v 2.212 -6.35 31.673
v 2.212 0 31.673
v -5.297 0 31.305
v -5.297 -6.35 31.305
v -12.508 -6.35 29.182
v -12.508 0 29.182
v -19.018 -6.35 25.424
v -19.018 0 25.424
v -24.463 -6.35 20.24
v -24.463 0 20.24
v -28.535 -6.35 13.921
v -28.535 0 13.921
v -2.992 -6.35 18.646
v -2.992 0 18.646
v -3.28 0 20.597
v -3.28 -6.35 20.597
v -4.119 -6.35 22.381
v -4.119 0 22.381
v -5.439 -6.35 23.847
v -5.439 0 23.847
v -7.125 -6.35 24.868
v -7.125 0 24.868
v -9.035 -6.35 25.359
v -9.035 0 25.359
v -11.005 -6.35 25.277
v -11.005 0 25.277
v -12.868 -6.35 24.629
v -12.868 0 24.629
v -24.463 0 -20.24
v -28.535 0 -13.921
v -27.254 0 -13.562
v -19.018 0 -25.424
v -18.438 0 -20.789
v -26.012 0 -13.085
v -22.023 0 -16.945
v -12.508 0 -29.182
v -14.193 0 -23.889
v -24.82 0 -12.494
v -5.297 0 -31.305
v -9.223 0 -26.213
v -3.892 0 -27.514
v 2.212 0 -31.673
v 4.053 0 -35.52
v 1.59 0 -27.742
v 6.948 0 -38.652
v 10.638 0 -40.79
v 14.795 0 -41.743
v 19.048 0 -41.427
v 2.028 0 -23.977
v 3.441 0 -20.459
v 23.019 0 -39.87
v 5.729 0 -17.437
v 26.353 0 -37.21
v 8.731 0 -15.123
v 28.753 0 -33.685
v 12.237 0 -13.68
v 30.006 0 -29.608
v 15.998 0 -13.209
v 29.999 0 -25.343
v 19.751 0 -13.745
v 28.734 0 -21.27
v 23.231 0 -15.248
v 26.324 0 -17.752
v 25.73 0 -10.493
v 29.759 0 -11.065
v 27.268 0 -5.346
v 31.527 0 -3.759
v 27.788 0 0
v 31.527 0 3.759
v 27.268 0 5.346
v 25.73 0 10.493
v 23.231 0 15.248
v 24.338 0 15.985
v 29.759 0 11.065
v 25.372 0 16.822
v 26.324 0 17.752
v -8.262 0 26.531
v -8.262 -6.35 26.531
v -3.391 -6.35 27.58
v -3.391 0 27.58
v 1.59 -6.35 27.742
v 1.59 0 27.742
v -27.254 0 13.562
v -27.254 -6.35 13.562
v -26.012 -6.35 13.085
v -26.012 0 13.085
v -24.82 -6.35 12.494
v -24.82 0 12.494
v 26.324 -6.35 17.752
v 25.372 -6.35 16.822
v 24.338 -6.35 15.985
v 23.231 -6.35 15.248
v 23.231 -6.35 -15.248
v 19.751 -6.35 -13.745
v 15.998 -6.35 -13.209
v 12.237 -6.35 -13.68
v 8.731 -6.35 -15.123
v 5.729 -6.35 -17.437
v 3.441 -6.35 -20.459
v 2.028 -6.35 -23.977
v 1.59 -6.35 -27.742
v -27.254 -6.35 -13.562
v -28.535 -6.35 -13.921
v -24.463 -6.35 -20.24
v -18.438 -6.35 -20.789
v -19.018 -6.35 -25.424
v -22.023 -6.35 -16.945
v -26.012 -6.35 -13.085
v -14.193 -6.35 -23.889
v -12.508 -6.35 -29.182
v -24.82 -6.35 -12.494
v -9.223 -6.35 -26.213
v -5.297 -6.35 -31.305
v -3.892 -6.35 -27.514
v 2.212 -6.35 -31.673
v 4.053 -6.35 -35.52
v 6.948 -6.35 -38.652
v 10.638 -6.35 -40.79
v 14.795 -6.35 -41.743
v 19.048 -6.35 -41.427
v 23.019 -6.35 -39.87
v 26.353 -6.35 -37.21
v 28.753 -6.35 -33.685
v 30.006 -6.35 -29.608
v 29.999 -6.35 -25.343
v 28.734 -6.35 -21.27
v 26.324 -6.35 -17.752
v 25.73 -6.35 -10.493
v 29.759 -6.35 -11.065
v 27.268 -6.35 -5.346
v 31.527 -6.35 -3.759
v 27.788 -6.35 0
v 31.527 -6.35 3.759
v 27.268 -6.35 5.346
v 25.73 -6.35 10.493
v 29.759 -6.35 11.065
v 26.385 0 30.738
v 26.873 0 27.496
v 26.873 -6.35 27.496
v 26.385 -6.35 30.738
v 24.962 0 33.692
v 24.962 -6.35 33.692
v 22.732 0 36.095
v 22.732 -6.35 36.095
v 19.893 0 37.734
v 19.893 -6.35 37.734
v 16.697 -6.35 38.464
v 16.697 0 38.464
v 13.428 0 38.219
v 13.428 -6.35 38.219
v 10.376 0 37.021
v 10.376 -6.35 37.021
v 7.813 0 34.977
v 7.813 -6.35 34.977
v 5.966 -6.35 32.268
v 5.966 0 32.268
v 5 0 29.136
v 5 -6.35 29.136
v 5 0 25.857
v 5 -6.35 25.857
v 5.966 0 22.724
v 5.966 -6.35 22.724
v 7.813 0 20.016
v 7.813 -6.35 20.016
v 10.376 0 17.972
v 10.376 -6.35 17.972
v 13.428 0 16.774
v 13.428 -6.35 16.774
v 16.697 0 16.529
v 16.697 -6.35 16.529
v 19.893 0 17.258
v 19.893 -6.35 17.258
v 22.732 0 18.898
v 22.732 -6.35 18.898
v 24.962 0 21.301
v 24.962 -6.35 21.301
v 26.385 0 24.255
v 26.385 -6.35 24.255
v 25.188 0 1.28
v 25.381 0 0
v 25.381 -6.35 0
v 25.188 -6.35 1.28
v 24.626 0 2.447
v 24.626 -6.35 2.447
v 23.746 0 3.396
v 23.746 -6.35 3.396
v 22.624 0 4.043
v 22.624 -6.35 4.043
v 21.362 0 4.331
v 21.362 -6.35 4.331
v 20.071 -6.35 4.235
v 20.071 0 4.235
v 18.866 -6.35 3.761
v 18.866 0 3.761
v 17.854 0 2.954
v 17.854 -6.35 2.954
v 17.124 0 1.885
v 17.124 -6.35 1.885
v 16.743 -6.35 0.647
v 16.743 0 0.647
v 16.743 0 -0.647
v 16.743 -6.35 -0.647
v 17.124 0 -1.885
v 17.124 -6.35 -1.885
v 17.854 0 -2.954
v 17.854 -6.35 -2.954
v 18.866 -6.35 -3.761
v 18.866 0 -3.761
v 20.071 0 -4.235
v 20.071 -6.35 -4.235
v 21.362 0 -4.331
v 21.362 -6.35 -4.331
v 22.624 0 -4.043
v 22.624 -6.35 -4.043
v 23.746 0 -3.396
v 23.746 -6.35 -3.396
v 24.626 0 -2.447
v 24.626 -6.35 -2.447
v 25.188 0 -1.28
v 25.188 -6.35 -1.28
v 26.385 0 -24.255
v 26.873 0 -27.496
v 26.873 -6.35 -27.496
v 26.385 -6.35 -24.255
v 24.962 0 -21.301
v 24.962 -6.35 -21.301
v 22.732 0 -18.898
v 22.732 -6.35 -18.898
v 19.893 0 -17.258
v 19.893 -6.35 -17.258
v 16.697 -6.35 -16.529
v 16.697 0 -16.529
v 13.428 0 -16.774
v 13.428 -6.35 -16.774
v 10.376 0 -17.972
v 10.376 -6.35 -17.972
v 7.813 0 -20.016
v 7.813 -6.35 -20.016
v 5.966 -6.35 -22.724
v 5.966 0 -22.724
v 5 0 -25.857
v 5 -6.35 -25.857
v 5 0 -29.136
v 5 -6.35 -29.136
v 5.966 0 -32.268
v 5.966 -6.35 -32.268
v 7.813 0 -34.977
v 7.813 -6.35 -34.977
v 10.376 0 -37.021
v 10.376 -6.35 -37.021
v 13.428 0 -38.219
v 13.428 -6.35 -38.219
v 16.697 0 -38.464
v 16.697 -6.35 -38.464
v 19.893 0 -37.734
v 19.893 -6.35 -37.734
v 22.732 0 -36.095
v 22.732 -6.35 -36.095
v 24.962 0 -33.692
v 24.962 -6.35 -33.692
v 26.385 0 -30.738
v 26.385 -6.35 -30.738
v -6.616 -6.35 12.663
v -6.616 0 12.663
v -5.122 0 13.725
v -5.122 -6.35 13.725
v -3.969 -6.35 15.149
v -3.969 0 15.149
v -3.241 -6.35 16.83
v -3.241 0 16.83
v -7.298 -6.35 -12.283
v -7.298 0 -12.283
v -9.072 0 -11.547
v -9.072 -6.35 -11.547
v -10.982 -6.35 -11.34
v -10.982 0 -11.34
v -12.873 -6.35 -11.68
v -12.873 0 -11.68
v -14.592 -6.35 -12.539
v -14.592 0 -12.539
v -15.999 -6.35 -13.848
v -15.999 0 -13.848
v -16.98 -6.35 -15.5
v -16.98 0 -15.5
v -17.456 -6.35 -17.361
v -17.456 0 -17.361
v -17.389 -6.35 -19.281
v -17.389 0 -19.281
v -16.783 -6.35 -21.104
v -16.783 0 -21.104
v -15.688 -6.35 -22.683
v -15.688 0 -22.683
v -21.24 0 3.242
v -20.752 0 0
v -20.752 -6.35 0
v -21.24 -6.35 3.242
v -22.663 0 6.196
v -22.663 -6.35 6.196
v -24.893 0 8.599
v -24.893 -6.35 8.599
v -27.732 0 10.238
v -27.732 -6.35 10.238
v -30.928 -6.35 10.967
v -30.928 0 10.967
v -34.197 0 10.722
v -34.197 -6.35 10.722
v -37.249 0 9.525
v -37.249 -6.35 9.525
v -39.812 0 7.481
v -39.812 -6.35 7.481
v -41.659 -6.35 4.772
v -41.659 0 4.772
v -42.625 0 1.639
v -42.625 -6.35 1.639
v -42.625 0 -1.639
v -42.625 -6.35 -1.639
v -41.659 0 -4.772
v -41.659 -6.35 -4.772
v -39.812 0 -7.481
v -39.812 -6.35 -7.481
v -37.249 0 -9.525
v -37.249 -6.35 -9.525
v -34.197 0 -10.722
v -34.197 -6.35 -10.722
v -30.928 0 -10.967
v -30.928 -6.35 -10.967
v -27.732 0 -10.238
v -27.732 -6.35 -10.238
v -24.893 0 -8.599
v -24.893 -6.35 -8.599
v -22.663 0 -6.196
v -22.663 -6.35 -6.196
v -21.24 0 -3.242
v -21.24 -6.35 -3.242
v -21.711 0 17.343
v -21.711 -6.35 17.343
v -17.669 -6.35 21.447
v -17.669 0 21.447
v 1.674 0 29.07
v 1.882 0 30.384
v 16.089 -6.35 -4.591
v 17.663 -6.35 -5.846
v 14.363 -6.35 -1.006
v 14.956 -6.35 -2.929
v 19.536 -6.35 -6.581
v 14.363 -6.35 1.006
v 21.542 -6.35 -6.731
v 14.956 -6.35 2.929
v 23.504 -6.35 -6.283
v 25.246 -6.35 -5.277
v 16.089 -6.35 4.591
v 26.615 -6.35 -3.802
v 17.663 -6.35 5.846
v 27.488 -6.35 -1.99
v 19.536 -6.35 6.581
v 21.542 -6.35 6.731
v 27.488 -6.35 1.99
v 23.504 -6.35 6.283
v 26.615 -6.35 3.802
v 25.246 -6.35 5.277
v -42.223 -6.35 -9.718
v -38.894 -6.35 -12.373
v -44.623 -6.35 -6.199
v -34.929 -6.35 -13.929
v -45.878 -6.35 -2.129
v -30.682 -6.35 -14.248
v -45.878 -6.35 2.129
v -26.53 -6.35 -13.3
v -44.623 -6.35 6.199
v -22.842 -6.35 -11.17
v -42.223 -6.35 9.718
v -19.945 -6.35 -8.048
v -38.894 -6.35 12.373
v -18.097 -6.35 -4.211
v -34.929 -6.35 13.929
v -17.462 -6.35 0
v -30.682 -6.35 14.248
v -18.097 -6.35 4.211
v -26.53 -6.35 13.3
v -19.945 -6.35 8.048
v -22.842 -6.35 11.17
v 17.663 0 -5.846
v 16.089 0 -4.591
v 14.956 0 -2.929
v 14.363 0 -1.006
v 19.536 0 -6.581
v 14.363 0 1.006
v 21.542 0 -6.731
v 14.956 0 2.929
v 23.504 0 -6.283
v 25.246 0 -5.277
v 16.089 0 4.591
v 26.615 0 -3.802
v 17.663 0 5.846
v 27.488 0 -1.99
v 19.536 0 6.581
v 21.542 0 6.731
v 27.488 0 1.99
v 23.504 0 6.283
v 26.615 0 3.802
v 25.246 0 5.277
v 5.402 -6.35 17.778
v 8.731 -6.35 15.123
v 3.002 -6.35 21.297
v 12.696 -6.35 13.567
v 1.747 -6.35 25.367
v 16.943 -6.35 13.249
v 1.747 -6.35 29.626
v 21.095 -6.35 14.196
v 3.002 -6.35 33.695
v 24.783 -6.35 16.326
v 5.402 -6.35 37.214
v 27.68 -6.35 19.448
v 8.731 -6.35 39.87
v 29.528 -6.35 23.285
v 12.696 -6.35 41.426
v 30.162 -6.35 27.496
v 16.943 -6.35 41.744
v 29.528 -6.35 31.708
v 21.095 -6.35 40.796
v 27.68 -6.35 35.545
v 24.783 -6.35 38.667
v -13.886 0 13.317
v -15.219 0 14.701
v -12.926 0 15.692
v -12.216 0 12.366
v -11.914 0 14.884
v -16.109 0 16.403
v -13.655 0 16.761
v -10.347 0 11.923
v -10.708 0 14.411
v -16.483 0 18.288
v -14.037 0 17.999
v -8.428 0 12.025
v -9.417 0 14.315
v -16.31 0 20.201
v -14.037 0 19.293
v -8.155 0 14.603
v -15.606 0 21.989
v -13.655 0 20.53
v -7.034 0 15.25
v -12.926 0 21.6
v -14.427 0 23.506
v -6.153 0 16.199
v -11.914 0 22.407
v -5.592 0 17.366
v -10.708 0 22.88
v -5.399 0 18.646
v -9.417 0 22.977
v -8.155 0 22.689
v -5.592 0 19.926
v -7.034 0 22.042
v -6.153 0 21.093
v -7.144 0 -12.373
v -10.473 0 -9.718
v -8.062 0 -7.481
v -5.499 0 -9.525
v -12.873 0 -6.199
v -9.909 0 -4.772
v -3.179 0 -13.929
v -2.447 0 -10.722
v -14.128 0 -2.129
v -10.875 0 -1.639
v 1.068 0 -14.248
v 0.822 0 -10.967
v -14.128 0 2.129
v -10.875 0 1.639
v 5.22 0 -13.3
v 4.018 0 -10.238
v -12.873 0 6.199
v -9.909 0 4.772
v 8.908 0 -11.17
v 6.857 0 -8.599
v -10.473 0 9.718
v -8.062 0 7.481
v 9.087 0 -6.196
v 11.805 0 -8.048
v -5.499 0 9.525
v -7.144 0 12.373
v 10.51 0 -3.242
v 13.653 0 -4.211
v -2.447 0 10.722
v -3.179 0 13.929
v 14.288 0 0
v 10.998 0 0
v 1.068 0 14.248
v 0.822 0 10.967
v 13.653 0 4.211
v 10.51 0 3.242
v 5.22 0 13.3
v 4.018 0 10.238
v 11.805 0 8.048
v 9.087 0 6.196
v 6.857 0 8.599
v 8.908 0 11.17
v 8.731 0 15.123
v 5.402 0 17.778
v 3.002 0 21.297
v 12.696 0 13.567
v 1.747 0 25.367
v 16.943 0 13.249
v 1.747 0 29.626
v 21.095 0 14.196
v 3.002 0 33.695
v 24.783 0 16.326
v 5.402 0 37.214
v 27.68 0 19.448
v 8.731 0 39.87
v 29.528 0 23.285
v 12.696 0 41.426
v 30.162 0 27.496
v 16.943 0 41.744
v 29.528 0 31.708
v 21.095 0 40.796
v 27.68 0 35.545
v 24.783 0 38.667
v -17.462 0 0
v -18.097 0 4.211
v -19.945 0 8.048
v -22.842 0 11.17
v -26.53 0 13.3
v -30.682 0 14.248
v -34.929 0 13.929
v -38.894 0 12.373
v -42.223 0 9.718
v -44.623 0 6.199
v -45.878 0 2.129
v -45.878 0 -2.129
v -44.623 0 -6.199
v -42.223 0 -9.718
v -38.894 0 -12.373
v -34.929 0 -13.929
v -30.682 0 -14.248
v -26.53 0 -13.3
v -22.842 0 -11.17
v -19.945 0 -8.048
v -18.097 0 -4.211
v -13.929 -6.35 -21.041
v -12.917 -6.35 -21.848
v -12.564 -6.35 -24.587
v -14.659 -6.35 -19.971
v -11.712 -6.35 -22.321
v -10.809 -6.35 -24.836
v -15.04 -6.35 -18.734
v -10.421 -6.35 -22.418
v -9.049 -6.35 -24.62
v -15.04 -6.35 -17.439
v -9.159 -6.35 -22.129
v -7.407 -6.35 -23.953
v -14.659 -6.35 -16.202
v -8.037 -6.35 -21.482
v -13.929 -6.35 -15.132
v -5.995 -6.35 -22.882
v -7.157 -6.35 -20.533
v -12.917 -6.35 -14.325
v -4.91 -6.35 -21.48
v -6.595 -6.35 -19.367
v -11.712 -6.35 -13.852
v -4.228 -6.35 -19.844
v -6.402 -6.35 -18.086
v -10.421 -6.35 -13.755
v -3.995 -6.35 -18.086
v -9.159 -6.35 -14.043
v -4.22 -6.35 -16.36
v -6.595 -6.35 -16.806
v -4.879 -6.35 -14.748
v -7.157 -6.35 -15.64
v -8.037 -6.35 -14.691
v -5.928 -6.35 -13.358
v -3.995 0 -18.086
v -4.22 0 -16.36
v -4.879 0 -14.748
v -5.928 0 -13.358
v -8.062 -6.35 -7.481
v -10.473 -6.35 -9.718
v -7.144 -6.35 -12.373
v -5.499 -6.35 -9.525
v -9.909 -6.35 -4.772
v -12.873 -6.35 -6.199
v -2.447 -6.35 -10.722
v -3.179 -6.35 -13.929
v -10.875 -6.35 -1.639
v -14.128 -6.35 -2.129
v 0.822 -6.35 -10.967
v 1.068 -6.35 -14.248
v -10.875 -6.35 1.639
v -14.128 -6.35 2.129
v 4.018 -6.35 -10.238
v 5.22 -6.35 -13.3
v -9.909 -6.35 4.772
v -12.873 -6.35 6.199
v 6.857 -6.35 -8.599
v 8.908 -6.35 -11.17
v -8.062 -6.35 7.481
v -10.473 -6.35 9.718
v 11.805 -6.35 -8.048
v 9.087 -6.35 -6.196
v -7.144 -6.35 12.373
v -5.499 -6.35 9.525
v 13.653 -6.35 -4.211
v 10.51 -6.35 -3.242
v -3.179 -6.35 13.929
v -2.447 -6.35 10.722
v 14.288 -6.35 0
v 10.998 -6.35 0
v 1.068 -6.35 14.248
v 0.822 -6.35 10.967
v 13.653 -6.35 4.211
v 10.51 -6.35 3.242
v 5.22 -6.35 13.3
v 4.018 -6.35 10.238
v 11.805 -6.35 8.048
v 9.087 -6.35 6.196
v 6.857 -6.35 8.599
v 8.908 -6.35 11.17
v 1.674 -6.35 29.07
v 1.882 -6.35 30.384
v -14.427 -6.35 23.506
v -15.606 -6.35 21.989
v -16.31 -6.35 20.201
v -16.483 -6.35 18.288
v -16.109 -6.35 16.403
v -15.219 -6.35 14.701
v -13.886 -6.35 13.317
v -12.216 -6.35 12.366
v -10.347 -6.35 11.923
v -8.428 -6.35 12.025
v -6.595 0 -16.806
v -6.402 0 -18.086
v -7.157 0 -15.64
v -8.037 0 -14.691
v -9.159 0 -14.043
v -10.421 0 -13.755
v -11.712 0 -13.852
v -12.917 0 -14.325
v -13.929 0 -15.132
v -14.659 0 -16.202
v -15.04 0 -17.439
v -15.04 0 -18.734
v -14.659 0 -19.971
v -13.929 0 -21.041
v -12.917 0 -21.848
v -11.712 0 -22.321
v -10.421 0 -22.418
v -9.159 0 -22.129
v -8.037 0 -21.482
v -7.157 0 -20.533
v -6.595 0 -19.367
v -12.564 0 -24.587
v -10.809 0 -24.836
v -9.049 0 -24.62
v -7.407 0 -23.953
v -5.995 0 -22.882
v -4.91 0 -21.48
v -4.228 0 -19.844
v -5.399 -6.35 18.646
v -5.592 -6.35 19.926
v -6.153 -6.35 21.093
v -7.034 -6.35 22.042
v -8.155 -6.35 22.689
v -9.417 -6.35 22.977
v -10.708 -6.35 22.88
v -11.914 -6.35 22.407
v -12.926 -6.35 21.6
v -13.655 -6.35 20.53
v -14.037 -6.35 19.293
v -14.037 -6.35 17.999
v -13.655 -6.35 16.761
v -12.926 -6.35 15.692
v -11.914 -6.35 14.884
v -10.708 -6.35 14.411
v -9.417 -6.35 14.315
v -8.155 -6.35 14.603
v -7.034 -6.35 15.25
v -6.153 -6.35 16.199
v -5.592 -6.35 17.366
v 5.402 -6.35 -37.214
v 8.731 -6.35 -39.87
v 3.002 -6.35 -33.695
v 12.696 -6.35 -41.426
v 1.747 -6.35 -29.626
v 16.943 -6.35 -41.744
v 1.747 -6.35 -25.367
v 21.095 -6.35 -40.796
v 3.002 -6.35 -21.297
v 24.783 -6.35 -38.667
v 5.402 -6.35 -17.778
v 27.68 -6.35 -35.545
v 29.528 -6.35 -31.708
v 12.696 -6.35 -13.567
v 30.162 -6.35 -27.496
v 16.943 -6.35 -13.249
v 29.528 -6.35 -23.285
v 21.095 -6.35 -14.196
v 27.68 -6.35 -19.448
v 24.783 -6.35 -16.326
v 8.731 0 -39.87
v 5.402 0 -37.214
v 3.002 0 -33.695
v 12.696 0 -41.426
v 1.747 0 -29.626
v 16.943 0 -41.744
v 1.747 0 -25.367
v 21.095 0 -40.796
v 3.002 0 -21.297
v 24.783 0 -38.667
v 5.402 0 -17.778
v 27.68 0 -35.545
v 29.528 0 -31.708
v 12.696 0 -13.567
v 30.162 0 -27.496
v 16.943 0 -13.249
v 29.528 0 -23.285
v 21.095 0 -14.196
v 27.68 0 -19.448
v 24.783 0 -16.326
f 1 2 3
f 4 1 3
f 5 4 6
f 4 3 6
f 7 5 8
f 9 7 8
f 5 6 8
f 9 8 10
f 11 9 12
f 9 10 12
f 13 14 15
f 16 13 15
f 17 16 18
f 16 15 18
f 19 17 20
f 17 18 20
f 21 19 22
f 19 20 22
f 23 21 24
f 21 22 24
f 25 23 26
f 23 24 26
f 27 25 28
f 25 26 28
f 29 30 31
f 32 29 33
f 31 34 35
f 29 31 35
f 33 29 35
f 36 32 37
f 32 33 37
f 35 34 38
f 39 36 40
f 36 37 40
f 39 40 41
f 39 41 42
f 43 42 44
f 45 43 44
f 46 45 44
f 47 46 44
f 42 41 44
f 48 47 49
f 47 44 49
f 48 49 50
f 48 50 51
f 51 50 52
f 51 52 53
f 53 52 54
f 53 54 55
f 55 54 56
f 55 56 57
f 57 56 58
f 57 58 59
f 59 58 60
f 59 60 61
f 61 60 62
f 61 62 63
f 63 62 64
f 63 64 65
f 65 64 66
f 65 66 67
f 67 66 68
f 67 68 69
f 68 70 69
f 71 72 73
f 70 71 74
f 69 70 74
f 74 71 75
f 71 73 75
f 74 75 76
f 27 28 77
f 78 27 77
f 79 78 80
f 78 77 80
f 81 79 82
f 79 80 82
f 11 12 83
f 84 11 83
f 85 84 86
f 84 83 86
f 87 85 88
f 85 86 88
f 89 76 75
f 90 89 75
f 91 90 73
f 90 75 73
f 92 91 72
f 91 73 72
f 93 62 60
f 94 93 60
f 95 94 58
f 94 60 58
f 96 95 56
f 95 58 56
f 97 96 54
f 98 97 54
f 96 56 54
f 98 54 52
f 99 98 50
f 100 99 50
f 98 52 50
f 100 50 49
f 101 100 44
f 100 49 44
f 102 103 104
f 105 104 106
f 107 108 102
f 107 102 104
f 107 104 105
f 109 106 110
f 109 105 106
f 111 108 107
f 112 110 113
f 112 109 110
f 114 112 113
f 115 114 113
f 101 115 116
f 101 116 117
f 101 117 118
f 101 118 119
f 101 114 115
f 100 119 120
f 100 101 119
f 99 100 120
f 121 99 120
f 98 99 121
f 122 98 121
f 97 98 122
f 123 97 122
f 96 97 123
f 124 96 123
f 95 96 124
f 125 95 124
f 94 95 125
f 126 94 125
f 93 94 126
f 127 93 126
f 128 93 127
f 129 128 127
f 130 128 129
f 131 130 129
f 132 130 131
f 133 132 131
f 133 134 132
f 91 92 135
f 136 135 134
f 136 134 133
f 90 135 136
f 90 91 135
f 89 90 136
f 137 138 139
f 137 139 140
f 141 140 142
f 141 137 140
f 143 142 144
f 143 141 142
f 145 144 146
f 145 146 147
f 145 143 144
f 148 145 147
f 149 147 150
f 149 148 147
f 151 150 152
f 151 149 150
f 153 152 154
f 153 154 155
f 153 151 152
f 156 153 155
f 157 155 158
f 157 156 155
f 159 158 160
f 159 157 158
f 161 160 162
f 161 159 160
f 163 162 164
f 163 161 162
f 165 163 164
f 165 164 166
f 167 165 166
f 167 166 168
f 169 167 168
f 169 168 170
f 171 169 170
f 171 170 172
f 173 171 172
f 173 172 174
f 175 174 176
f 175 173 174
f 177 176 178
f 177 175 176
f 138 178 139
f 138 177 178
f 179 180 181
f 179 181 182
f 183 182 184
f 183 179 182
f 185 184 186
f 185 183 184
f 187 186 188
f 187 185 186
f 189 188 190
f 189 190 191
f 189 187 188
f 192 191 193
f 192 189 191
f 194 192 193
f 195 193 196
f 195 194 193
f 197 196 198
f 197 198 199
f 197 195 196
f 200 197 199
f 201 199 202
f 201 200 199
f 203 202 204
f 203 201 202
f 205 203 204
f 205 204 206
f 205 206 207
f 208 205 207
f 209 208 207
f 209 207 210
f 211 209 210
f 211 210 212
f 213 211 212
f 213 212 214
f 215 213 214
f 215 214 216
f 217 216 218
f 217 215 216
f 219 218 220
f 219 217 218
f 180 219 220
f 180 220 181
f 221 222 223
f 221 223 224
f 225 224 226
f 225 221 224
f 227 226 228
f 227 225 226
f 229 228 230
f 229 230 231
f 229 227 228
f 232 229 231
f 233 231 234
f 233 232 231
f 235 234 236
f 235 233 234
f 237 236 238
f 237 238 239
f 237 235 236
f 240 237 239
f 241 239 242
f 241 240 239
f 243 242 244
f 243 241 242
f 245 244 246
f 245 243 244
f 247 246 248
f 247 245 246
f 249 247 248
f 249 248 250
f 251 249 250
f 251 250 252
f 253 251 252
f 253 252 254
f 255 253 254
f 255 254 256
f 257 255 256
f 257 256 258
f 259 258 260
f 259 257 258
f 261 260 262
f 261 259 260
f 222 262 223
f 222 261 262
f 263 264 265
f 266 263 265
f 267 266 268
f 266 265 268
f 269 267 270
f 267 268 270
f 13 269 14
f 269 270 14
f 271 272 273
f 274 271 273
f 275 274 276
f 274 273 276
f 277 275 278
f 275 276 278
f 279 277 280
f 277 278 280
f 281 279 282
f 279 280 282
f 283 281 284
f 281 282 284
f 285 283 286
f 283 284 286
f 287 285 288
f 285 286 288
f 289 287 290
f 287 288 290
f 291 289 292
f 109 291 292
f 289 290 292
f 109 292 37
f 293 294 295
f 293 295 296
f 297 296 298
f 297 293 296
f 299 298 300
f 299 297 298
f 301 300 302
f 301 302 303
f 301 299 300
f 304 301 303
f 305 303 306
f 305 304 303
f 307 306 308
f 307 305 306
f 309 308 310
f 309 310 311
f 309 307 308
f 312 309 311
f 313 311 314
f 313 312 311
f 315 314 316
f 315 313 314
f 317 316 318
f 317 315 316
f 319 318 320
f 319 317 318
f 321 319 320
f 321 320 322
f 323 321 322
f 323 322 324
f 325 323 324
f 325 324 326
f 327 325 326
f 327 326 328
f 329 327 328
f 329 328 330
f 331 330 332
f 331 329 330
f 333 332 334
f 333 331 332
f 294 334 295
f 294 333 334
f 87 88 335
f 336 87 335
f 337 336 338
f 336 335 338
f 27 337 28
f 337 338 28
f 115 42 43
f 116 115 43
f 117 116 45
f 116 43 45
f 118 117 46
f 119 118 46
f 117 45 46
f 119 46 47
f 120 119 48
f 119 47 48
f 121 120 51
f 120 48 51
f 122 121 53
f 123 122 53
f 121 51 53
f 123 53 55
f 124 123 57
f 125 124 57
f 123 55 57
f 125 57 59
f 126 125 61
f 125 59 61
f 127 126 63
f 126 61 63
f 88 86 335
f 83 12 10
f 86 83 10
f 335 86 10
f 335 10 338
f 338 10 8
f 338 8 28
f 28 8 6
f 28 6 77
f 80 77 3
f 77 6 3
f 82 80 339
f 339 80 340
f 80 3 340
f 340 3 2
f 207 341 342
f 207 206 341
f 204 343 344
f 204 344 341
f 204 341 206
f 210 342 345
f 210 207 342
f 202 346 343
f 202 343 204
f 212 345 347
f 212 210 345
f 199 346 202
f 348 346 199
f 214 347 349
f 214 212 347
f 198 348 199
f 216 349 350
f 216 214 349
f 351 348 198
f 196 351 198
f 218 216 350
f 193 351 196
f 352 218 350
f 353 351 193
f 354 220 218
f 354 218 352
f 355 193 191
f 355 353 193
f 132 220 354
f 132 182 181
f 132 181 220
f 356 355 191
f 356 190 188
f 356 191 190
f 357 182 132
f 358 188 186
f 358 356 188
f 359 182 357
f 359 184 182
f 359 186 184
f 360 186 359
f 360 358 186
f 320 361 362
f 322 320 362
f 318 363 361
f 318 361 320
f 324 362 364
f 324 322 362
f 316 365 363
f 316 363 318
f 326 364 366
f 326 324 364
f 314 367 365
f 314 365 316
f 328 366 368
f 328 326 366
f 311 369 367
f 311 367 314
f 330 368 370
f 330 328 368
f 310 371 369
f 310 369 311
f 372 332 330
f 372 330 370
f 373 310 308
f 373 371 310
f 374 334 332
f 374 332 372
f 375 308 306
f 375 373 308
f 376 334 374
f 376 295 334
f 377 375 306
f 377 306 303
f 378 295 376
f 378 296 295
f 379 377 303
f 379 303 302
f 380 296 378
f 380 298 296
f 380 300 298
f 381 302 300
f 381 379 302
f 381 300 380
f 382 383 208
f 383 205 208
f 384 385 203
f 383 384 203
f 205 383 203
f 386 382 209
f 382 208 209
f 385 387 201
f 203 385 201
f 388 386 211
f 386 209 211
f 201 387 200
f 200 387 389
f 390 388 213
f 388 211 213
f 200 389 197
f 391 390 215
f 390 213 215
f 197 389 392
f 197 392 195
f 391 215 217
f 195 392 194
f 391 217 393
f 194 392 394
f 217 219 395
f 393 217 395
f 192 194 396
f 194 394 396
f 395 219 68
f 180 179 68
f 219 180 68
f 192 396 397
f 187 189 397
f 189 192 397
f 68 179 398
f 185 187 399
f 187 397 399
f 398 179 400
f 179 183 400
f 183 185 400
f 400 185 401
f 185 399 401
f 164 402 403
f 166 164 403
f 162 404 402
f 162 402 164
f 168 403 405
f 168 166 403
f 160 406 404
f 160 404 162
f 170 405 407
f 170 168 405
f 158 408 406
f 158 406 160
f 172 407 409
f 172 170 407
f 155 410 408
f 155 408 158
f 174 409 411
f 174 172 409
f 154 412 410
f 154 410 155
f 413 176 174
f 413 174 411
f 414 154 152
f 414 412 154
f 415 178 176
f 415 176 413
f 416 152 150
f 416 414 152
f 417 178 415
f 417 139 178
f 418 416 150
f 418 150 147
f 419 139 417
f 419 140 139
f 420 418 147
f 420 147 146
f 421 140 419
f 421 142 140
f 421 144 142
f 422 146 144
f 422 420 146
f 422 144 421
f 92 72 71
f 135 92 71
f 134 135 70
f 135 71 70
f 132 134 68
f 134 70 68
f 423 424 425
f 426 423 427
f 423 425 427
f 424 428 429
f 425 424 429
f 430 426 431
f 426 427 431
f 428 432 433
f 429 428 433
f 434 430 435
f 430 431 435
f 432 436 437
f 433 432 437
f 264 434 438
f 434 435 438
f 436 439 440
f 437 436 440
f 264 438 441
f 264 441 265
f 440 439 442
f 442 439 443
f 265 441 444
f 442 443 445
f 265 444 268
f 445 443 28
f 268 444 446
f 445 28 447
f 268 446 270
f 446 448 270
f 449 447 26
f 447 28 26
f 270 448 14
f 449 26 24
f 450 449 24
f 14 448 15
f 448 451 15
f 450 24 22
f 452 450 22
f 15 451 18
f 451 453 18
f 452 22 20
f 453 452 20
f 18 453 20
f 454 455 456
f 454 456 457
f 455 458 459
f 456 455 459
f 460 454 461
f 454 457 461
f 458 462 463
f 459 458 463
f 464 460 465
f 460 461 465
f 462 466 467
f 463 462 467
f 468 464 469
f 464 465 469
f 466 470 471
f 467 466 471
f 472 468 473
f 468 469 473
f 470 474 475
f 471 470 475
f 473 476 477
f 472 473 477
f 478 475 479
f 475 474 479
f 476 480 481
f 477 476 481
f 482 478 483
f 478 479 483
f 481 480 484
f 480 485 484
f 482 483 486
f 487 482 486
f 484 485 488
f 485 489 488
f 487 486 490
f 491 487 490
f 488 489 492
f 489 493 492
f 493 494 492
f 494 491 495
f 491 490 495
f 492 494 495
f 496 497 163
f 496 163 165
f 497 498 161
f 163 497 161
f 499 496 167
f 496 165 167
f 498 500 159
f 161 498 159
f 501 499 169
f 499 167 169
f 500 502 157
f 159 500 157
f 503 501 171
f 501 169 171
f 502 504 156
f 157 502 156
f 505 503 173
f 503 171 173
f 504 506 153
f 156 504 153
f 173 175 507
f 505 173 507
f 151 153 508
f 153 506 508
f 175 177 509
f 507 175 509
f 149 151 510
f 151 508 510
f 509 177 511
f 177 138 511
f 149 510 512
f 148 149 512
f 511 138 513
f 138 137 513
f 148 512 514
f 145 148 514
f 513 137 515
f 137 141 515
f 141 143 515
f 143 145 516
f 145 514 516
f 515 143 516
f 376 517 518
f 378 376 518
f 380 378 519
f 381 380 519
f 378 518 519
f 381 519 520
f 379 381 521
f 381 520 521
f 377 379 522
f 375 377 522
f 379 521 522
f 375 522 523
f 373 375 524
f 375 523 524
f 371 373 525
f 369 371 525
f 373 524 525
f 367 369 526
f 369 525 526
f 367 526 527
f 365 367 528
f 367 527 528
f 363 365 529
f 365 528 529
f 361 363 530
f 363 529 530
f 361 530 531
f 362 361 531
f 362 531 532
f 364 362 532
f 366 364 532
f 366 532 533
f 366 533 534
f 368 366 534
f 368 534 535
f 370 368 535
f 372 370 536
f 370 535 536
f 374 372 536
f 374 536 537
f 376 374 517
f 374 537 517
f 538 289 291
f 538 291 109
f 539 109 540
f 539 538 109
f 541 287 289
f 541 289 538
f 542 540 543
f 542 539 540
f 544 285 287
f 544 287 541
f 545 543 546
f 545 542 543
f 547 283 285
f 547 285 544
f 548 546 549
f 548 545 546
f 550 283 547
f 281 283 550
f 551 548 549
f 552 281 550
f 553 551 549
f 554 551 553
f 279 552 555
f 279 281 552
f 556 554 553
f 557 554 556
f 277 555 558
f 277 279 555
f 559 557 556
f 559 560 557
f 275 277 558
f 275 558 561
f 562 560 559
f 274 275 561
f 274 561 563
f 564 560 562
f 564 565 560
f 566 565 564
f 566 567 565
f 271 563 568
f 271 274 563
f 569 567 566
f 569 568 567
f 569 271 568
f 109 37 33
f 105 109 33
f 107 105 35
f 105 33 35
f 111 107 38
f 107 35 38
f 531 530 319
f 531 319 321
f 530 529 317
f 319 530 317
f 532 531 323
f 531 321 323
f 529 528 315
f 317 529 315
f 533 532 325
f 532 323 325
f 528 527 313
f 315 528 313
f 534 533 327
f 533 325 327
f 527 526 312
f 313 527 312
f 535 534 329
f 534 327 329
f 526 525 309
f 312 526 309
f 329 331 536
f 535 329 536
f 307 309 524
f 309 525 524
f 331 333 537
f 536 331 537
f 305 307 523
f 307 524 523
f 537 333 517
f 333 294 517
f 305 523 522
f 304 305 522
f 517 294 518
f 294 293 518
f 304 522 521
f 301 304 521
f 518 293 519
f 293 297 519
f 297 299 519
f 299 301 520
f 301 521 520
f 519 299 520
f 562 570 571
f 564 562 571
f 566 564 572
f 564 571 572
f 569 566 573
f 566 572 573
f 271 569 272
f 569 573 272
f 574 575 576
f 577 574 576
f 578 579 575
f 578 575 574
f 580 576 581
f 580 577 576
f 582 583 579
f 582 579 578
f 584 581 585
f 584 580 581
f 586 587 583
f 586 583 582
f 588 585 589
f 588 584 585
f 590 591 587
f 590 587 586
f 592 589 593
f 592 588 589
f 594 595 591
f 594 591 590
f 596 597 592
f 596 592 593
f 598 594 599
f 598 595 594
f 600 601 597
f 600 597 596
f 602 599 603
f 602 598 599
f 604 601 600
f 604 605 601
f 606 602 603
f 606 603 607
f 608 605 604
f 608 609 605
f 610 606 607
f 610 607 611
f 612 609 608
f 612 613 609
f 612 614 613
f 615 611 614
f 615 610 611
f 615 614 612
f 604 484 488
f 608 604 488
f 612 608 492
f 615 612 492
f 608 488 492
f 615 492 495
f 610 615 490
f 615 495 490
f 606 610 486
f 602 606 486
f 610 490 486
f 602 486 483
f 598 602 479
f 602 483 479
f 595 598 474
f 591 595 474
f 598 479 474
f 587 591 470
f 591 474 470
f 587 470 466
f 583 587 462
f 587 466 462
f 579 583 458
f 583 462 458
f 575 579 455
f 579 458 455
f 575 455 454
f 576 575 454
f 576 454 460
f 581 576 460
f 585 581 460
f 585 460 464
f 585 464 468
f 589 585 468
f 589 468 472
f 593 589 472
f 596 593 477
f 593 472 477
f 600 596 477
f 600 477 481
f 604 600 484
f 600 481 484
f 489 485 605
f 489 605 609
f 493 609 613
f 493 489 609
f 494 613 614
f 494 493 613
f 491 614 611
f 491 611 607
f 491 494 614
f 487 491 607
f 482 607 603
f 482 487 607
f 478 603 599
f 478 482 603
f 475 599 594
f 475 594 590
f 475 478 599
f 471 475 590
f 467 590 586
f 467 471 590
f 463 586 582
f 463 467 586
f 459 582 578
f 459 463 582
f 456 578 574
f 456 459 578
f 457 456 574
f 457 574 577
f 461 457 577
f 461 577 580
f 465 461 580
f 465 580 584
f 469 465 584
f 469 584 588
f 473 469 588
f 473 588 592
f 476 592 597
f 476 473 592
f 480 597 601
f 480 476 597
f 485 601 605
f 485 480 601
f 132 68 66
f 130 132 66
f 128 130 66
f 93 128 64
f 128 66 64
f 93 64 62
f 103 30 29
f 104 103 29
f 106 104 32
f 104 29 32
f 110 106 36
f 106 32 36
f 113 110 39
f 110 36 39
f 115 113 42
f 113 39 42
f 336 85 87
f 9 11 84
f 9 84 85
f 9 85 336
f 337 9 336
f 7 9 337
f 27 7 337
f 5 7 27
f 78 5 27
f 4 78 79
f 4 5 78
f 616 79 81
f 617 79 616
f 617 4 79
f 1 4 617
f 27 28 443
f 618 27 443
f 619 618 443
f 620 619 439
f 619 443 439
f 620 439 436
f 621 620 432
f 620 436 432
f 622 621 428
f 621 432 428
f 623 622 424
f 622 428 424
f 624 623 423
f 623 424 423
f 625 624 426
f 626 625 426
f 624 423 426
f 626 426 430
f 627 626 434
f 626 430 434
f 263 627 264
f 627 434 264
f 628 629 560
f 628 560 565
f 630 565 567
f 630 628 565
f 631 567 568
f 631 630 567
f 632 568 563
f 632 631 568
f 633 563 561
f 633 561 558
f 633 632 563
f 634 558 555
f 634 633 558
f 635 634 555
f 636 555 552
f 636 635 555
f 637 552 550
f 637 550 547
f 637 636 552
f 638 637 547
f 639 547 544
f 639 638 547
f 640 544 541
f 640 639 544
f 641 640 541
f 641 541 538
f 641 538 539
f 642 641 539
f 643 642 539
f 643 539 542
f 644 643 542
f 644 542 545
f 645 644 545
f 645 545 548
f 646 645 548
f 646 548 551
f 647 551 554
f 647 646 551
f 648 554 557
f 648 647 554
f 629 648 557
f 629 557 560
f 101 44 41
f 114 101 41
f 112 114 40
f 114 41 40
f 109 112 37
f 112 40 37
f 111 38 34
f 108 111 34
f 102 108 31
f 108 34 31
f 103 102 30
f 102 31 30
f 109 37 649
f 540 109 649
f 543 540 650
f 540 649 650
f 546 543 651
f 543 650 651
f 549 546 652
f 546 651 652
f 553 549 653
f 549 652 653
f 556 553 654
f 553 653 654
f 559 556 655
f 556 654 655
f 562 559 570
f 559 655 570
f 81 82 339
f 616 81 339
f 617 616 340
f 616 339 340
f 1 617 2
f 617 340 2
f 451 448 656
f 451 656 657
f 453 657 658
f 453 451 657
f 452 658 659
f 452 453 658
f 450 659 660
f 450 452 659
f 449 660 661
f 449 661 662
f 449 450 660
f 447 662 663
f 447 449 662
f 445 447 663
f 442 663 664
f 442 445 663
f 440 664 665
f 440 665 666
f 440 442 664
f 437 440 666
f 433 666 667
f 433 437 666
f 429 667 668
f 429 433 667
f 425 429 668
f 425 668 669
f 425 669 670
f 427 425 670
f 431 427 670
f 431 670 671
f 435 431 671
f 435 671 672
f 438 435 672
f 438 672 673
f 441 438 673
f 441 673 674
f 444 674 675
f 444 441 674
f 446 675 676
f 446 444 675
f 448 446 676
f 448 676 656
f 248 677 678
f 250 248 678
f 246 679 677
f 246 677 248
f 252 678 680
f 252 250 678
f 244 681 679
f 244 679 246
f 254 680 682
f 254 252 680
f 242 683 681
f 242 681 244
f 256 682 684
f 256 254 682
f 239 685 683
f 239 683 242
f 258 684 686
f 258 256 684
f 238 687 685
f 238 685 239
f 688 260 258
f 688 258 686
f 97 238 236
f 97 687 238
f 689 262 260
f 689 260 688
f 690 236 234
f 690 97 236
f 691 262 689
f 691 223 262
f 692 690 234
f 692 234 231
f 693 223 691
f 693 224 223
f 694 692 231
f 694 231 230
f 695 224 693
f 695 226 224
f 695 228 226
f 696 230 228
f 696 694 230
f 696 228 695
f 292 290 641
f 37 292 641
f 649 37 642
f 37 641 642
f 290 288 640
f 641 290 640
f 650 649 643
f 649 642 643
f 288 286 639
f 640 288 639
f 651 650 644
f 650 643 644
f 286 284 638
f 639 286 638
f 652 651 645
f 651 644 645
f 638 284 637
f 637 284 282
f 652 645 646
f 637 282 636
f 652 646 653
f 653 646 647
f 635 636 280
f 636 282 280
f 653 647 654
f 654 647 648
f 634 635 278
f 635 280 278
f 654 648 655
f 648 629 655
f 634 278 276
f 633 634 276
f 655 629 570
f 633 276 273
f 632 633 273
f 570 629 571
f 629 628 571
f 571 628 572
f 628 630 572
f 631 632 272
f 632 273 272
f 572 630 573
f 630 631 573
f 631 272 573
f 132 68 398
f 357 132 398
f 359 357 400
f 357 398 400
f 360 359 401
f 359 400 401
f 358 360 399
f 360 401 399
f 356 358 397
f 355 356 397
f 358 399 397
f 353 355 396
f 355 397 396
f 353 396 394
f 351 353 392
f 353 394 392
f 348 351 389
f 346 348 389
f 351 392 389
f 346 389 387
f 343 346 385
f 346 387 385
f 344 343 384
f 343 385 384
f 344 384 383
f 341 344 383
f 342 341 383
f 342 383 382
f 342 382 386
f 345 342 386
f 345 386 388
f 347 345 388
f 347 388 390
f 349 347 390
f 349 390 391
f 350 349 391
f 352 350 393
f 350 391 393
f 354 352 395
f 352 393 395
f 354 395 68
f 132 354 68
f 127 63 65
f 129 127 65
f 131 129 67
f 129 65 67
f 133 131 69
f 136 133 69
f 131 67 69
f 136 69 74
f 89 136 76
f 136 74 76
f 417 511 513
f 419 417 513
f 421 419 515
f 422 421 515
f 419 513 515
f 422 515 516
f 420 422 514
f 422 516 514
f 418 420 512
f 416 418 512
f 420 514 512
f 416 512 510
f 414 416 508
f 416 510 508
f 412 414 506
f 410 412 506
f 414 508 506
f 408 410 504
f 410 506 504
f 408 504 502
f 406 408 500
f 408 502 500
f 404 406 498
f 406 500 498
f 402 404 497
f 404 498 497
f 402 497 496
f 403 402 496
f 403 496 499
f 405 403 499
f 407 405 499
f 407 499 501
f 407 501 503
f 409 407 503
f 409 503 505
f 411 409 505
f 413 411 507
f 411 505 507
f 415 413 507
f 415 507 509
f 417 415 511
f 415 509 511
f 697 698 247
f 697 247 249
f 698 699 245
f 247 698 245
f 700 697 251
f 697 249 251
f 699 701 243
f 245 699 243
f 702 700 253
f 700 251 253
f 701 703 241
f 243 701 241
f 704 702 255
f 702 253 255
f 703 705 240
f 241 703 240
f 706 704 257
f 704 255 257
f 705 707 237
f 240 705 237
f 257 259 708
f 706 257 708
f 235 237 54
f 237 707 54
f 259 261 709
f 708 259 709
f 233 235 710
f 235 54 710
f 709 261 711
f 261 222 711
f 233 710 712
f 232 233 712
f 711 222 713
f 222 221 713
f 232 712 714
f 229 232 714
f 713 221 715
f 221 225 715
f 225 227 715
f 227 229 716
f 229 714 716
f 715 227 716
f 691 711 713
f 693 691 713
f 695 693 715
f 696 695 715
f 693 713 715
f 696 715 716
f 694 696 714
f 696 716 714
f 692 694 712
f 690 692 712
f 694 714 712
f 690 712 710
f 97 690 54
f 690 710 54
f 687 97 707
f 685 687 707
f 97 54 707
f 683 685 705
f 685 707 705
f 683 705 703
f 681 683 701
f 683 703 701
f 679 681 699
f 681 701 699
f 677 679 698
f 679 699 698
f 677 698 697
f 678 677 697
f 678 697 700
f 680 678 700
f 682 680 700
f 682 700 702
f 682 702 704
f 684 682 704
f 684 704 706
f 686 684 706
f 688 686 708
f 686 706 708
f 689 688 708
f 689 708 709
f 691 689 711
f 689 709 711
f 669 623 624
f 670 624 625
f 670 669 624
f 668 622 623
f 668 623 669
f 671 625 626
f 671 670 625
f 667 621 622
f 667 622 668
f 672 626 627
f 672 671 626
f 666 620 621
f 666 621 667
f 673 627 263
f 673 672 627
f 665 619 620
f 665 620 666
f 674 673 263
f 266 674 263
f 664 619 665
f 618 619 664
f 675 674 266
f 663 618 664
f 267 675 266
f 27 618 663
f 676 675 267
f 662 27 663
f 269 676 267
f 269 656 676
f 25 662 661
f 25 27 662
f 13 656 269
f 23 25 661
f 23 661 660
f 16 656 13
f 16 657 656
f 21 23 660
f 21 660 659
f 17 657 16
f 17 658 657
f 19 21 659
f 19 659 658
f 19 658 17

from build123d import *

# Parameters (mm, degrees)
F0_R     = 14.2875
F0_R_2   = 10.9982
F2_DEPTH = 6.35
F1_R     = 4.3434


with BuildPart() as f2:
    # F0 (on Front) → F2 (new body)
    with BuildSketch(Plane.XZ):
        with Locations((-31.75, 0)):
            Circle(F0_R)
        with Locations((-31.75, 0)):
            Circle(F0_R_2, mode=Mode.SUBTRACT)
    extrude(amount=F2_DEPTH)


with BuildPart() as f2b:
    # F0 (on Front) → F2, piece 2 (new body)
    with BuildSketch(Plane.XZ):
        with Locations((15.875, -27.4963065702)):
            Circle(F0_R)
        with Locations((15.875, -27.4963065702)):
            Circle(F0_R_2, mode=Mode.SUBTRACT)
    extrude(amount=F2_DEPTH)


with BuildPart() as f2c:
    # F0 (on Front) → F2, piece 3 (new body)
    with BuildSketch(Plane.XZ):
        Circle(F0_R)
        Circle(F0_R_2, mode=Mode.SUBTRACT)
    extrude(amount=F2_DEPTH)


with BuildPart() as f2d:
    # F0 (on Front) → F2, piece 4 (new body)
    with BuildSketch(Plane.XZ):
        with Locations((15.875, 27.4963065702)):
            Circle(F0_R)
        with Locations((15.875, 27.4963065702)):
            Circle(F0_R_2, mode=Mode.SUBTRACT)
    extrude(amount=F2_DEPTH)


with BuildPart() as f2e:
    # F1 (on Front) → F2, piece 5 (new body)
    with BuildSketch(Plane.XZ):
        with BuildLine():
            ThreePointArc((-24.82016626, -12.4944011696), (-26.6278196588, -13.3377631109), (-28.5353125, -13.9211508334))
            ThreePointArc((-28.5353125, -13.9211508334), (-15.875, -27.4963065702), (2.2115859783, -31.6728809466))
            ThreePointArc((2.2115859783, -31.6728809466), (23.01875, -39.8696445267), (26.3237265217, -17.7517301132))
            ThreePointArc((26.3237265217, -17.7517301132), (24.8647515131, -16.3914867164), (23.2305519479, -15.2476939225))
            ThreePointArc((23.2305519479, -15.2476939225), (8.73125, -15.1229686136), (1.5896143121, -27.7420950921))
            ThreePointArc((1.5896143121, -27.7420950921), (-6.5896091759, -26.9949581342), (-14.1931403047, -23.8894428996))
            ThreePointArc((-14.1931403047, -23.8894428996), (-20.3216944737, -18.9520301677), (-24.82016626, -12.4944011696))
        make_face()
        with BuildLine():
            ThreePointArc((26.3237265217, -17.7517301132), (31.75, 0), (26.3237265217, 17.7517301132))
            ThreePointArc((26.3237265217, 17.7517301132), (24.8647515131, 16.3914867164), (23.2305519479, 15.2476939225))
            ThreePointArc((23.2305519479, 15.2476939225), (26.6239741499, 7.9570543687), (27.7876, 0))
            ThreePointArc((27.7876, 0), (26.6239741499, -7.9570543687), (23.2305519479, -15.2476939225))
            ThreePointArc((23.2305519479, -15.2476939225), (24.8647515131, -16.3914867164), (26.3237265217, -17.7517301132))
        make_face()
    extrude(amount=F2_DEPTH)


with BuildPart() as f2f:
    # F1 (on Front) → F2, piece 6 (new body)
    with BuildSketch(Plane.XZ):
        with BuildLine():
            ThreePointArc((-7.2976613214, -12.283191584), (-16.5485264172, -14.638577782), (-14.1931403047, -23.8894428996))
            ThreePointArc((-14.1931403047, -23.8894428996), (-7.4069309988, -23.9529853791), (-3.9953507594, -18.0863172736))
            ThreePointArc((-3.9953507594, -18.0863172736), (-4.8787326847, -14.7478474588), (-7.2976613214, -12.283191584))
        make_face()
        with Locations((-10.7454007594, -18.0863172736)):
            Circle(F1_R, mode=Mode.SUBTRACT)
    extrude(amount=F2_DEPTH)


with BuildPart() as f2g:
    # F1 (on Front) → F2, piece 7 (new body)
    with BuildSketch(Plane.XZ):
        with BuildLine():
            ThreePointArc((14.2875, 0), (21.03755, -6.75005), (27.7876, 0))
            ThreePointArc((27.7876, 0), (21.03755, 6.75005), (14.2875, 0))
        make_face()
        with Locations((21.03755, 0)):
            Circle(F1_R, mode=Mode.SUBTRACT)
    extrude(amount=F2_DEPTH)


with BuildPart() as f2h:
    # F1 (on Front) → F2, piece 8 (new body)
    with BuildSketch(Plane.XZ):
        with BuildLine():
            ThreePointArc((-2.9919438402, 18.6459664813), (-6.2445703341, 24.4192847491), (-12.8677829294, 24.6286596518))
            ThreePointArc((-12.8677829294, 24.6286596518), (-15.7246869869, 15.5201773466), (-6.61620466, 12.6632733583))
            ThreePointArc((-6.61620466, 12.6632733583), (-3.9686755457, 15.1485430192), (-2.9919438402, 18.6459664813))
        make_face()
        with Locations((-9.7419938402, 18.6459664813)):
            Circle(F1_R, mode=Mode.SUBTRACT)
    extrude(amount=F2_DEPTH)


with BuildPart() as f2i:
    # F1 (on Front) → F2, piece 9 (new body)
    with BuildSketch(Plane.XZ):
        with BuildLine():
            ThreePointArc((1.5896143121, 27.7420950921), (1.7630681457, 29.7292498273), (2.2115859783, 31.6728809466))
            ThreePointArc((2.2115859783, 31.6728809466), (-15.875, 27.4963065702), (-28.5353125, 13.9211508334))
            ThreePointArc((-28.5353125, 13.9211508334), (-26.6278196588, 13.3377631109), (-24.82016626, 12.4944011696))
            ThreePointArc((-24.82016626, 12.4944011696), (-19.7966016213, 19.4998789229), (-12.8677829294, 24.6286596518))
            ThreePointArc((-12.8677829294, 24.6286596518), (-5.8500121282, 27.1648315264), (1.5896143121, 27.7420950921))
        make_face()
    extrude(amount=F2_DEPTH)


solid = Compound([f2.part, f2b.part, f2c.part, f2d.part, f2e.part, f2f.part, f2g.part, f2h.part, f2i.part])
